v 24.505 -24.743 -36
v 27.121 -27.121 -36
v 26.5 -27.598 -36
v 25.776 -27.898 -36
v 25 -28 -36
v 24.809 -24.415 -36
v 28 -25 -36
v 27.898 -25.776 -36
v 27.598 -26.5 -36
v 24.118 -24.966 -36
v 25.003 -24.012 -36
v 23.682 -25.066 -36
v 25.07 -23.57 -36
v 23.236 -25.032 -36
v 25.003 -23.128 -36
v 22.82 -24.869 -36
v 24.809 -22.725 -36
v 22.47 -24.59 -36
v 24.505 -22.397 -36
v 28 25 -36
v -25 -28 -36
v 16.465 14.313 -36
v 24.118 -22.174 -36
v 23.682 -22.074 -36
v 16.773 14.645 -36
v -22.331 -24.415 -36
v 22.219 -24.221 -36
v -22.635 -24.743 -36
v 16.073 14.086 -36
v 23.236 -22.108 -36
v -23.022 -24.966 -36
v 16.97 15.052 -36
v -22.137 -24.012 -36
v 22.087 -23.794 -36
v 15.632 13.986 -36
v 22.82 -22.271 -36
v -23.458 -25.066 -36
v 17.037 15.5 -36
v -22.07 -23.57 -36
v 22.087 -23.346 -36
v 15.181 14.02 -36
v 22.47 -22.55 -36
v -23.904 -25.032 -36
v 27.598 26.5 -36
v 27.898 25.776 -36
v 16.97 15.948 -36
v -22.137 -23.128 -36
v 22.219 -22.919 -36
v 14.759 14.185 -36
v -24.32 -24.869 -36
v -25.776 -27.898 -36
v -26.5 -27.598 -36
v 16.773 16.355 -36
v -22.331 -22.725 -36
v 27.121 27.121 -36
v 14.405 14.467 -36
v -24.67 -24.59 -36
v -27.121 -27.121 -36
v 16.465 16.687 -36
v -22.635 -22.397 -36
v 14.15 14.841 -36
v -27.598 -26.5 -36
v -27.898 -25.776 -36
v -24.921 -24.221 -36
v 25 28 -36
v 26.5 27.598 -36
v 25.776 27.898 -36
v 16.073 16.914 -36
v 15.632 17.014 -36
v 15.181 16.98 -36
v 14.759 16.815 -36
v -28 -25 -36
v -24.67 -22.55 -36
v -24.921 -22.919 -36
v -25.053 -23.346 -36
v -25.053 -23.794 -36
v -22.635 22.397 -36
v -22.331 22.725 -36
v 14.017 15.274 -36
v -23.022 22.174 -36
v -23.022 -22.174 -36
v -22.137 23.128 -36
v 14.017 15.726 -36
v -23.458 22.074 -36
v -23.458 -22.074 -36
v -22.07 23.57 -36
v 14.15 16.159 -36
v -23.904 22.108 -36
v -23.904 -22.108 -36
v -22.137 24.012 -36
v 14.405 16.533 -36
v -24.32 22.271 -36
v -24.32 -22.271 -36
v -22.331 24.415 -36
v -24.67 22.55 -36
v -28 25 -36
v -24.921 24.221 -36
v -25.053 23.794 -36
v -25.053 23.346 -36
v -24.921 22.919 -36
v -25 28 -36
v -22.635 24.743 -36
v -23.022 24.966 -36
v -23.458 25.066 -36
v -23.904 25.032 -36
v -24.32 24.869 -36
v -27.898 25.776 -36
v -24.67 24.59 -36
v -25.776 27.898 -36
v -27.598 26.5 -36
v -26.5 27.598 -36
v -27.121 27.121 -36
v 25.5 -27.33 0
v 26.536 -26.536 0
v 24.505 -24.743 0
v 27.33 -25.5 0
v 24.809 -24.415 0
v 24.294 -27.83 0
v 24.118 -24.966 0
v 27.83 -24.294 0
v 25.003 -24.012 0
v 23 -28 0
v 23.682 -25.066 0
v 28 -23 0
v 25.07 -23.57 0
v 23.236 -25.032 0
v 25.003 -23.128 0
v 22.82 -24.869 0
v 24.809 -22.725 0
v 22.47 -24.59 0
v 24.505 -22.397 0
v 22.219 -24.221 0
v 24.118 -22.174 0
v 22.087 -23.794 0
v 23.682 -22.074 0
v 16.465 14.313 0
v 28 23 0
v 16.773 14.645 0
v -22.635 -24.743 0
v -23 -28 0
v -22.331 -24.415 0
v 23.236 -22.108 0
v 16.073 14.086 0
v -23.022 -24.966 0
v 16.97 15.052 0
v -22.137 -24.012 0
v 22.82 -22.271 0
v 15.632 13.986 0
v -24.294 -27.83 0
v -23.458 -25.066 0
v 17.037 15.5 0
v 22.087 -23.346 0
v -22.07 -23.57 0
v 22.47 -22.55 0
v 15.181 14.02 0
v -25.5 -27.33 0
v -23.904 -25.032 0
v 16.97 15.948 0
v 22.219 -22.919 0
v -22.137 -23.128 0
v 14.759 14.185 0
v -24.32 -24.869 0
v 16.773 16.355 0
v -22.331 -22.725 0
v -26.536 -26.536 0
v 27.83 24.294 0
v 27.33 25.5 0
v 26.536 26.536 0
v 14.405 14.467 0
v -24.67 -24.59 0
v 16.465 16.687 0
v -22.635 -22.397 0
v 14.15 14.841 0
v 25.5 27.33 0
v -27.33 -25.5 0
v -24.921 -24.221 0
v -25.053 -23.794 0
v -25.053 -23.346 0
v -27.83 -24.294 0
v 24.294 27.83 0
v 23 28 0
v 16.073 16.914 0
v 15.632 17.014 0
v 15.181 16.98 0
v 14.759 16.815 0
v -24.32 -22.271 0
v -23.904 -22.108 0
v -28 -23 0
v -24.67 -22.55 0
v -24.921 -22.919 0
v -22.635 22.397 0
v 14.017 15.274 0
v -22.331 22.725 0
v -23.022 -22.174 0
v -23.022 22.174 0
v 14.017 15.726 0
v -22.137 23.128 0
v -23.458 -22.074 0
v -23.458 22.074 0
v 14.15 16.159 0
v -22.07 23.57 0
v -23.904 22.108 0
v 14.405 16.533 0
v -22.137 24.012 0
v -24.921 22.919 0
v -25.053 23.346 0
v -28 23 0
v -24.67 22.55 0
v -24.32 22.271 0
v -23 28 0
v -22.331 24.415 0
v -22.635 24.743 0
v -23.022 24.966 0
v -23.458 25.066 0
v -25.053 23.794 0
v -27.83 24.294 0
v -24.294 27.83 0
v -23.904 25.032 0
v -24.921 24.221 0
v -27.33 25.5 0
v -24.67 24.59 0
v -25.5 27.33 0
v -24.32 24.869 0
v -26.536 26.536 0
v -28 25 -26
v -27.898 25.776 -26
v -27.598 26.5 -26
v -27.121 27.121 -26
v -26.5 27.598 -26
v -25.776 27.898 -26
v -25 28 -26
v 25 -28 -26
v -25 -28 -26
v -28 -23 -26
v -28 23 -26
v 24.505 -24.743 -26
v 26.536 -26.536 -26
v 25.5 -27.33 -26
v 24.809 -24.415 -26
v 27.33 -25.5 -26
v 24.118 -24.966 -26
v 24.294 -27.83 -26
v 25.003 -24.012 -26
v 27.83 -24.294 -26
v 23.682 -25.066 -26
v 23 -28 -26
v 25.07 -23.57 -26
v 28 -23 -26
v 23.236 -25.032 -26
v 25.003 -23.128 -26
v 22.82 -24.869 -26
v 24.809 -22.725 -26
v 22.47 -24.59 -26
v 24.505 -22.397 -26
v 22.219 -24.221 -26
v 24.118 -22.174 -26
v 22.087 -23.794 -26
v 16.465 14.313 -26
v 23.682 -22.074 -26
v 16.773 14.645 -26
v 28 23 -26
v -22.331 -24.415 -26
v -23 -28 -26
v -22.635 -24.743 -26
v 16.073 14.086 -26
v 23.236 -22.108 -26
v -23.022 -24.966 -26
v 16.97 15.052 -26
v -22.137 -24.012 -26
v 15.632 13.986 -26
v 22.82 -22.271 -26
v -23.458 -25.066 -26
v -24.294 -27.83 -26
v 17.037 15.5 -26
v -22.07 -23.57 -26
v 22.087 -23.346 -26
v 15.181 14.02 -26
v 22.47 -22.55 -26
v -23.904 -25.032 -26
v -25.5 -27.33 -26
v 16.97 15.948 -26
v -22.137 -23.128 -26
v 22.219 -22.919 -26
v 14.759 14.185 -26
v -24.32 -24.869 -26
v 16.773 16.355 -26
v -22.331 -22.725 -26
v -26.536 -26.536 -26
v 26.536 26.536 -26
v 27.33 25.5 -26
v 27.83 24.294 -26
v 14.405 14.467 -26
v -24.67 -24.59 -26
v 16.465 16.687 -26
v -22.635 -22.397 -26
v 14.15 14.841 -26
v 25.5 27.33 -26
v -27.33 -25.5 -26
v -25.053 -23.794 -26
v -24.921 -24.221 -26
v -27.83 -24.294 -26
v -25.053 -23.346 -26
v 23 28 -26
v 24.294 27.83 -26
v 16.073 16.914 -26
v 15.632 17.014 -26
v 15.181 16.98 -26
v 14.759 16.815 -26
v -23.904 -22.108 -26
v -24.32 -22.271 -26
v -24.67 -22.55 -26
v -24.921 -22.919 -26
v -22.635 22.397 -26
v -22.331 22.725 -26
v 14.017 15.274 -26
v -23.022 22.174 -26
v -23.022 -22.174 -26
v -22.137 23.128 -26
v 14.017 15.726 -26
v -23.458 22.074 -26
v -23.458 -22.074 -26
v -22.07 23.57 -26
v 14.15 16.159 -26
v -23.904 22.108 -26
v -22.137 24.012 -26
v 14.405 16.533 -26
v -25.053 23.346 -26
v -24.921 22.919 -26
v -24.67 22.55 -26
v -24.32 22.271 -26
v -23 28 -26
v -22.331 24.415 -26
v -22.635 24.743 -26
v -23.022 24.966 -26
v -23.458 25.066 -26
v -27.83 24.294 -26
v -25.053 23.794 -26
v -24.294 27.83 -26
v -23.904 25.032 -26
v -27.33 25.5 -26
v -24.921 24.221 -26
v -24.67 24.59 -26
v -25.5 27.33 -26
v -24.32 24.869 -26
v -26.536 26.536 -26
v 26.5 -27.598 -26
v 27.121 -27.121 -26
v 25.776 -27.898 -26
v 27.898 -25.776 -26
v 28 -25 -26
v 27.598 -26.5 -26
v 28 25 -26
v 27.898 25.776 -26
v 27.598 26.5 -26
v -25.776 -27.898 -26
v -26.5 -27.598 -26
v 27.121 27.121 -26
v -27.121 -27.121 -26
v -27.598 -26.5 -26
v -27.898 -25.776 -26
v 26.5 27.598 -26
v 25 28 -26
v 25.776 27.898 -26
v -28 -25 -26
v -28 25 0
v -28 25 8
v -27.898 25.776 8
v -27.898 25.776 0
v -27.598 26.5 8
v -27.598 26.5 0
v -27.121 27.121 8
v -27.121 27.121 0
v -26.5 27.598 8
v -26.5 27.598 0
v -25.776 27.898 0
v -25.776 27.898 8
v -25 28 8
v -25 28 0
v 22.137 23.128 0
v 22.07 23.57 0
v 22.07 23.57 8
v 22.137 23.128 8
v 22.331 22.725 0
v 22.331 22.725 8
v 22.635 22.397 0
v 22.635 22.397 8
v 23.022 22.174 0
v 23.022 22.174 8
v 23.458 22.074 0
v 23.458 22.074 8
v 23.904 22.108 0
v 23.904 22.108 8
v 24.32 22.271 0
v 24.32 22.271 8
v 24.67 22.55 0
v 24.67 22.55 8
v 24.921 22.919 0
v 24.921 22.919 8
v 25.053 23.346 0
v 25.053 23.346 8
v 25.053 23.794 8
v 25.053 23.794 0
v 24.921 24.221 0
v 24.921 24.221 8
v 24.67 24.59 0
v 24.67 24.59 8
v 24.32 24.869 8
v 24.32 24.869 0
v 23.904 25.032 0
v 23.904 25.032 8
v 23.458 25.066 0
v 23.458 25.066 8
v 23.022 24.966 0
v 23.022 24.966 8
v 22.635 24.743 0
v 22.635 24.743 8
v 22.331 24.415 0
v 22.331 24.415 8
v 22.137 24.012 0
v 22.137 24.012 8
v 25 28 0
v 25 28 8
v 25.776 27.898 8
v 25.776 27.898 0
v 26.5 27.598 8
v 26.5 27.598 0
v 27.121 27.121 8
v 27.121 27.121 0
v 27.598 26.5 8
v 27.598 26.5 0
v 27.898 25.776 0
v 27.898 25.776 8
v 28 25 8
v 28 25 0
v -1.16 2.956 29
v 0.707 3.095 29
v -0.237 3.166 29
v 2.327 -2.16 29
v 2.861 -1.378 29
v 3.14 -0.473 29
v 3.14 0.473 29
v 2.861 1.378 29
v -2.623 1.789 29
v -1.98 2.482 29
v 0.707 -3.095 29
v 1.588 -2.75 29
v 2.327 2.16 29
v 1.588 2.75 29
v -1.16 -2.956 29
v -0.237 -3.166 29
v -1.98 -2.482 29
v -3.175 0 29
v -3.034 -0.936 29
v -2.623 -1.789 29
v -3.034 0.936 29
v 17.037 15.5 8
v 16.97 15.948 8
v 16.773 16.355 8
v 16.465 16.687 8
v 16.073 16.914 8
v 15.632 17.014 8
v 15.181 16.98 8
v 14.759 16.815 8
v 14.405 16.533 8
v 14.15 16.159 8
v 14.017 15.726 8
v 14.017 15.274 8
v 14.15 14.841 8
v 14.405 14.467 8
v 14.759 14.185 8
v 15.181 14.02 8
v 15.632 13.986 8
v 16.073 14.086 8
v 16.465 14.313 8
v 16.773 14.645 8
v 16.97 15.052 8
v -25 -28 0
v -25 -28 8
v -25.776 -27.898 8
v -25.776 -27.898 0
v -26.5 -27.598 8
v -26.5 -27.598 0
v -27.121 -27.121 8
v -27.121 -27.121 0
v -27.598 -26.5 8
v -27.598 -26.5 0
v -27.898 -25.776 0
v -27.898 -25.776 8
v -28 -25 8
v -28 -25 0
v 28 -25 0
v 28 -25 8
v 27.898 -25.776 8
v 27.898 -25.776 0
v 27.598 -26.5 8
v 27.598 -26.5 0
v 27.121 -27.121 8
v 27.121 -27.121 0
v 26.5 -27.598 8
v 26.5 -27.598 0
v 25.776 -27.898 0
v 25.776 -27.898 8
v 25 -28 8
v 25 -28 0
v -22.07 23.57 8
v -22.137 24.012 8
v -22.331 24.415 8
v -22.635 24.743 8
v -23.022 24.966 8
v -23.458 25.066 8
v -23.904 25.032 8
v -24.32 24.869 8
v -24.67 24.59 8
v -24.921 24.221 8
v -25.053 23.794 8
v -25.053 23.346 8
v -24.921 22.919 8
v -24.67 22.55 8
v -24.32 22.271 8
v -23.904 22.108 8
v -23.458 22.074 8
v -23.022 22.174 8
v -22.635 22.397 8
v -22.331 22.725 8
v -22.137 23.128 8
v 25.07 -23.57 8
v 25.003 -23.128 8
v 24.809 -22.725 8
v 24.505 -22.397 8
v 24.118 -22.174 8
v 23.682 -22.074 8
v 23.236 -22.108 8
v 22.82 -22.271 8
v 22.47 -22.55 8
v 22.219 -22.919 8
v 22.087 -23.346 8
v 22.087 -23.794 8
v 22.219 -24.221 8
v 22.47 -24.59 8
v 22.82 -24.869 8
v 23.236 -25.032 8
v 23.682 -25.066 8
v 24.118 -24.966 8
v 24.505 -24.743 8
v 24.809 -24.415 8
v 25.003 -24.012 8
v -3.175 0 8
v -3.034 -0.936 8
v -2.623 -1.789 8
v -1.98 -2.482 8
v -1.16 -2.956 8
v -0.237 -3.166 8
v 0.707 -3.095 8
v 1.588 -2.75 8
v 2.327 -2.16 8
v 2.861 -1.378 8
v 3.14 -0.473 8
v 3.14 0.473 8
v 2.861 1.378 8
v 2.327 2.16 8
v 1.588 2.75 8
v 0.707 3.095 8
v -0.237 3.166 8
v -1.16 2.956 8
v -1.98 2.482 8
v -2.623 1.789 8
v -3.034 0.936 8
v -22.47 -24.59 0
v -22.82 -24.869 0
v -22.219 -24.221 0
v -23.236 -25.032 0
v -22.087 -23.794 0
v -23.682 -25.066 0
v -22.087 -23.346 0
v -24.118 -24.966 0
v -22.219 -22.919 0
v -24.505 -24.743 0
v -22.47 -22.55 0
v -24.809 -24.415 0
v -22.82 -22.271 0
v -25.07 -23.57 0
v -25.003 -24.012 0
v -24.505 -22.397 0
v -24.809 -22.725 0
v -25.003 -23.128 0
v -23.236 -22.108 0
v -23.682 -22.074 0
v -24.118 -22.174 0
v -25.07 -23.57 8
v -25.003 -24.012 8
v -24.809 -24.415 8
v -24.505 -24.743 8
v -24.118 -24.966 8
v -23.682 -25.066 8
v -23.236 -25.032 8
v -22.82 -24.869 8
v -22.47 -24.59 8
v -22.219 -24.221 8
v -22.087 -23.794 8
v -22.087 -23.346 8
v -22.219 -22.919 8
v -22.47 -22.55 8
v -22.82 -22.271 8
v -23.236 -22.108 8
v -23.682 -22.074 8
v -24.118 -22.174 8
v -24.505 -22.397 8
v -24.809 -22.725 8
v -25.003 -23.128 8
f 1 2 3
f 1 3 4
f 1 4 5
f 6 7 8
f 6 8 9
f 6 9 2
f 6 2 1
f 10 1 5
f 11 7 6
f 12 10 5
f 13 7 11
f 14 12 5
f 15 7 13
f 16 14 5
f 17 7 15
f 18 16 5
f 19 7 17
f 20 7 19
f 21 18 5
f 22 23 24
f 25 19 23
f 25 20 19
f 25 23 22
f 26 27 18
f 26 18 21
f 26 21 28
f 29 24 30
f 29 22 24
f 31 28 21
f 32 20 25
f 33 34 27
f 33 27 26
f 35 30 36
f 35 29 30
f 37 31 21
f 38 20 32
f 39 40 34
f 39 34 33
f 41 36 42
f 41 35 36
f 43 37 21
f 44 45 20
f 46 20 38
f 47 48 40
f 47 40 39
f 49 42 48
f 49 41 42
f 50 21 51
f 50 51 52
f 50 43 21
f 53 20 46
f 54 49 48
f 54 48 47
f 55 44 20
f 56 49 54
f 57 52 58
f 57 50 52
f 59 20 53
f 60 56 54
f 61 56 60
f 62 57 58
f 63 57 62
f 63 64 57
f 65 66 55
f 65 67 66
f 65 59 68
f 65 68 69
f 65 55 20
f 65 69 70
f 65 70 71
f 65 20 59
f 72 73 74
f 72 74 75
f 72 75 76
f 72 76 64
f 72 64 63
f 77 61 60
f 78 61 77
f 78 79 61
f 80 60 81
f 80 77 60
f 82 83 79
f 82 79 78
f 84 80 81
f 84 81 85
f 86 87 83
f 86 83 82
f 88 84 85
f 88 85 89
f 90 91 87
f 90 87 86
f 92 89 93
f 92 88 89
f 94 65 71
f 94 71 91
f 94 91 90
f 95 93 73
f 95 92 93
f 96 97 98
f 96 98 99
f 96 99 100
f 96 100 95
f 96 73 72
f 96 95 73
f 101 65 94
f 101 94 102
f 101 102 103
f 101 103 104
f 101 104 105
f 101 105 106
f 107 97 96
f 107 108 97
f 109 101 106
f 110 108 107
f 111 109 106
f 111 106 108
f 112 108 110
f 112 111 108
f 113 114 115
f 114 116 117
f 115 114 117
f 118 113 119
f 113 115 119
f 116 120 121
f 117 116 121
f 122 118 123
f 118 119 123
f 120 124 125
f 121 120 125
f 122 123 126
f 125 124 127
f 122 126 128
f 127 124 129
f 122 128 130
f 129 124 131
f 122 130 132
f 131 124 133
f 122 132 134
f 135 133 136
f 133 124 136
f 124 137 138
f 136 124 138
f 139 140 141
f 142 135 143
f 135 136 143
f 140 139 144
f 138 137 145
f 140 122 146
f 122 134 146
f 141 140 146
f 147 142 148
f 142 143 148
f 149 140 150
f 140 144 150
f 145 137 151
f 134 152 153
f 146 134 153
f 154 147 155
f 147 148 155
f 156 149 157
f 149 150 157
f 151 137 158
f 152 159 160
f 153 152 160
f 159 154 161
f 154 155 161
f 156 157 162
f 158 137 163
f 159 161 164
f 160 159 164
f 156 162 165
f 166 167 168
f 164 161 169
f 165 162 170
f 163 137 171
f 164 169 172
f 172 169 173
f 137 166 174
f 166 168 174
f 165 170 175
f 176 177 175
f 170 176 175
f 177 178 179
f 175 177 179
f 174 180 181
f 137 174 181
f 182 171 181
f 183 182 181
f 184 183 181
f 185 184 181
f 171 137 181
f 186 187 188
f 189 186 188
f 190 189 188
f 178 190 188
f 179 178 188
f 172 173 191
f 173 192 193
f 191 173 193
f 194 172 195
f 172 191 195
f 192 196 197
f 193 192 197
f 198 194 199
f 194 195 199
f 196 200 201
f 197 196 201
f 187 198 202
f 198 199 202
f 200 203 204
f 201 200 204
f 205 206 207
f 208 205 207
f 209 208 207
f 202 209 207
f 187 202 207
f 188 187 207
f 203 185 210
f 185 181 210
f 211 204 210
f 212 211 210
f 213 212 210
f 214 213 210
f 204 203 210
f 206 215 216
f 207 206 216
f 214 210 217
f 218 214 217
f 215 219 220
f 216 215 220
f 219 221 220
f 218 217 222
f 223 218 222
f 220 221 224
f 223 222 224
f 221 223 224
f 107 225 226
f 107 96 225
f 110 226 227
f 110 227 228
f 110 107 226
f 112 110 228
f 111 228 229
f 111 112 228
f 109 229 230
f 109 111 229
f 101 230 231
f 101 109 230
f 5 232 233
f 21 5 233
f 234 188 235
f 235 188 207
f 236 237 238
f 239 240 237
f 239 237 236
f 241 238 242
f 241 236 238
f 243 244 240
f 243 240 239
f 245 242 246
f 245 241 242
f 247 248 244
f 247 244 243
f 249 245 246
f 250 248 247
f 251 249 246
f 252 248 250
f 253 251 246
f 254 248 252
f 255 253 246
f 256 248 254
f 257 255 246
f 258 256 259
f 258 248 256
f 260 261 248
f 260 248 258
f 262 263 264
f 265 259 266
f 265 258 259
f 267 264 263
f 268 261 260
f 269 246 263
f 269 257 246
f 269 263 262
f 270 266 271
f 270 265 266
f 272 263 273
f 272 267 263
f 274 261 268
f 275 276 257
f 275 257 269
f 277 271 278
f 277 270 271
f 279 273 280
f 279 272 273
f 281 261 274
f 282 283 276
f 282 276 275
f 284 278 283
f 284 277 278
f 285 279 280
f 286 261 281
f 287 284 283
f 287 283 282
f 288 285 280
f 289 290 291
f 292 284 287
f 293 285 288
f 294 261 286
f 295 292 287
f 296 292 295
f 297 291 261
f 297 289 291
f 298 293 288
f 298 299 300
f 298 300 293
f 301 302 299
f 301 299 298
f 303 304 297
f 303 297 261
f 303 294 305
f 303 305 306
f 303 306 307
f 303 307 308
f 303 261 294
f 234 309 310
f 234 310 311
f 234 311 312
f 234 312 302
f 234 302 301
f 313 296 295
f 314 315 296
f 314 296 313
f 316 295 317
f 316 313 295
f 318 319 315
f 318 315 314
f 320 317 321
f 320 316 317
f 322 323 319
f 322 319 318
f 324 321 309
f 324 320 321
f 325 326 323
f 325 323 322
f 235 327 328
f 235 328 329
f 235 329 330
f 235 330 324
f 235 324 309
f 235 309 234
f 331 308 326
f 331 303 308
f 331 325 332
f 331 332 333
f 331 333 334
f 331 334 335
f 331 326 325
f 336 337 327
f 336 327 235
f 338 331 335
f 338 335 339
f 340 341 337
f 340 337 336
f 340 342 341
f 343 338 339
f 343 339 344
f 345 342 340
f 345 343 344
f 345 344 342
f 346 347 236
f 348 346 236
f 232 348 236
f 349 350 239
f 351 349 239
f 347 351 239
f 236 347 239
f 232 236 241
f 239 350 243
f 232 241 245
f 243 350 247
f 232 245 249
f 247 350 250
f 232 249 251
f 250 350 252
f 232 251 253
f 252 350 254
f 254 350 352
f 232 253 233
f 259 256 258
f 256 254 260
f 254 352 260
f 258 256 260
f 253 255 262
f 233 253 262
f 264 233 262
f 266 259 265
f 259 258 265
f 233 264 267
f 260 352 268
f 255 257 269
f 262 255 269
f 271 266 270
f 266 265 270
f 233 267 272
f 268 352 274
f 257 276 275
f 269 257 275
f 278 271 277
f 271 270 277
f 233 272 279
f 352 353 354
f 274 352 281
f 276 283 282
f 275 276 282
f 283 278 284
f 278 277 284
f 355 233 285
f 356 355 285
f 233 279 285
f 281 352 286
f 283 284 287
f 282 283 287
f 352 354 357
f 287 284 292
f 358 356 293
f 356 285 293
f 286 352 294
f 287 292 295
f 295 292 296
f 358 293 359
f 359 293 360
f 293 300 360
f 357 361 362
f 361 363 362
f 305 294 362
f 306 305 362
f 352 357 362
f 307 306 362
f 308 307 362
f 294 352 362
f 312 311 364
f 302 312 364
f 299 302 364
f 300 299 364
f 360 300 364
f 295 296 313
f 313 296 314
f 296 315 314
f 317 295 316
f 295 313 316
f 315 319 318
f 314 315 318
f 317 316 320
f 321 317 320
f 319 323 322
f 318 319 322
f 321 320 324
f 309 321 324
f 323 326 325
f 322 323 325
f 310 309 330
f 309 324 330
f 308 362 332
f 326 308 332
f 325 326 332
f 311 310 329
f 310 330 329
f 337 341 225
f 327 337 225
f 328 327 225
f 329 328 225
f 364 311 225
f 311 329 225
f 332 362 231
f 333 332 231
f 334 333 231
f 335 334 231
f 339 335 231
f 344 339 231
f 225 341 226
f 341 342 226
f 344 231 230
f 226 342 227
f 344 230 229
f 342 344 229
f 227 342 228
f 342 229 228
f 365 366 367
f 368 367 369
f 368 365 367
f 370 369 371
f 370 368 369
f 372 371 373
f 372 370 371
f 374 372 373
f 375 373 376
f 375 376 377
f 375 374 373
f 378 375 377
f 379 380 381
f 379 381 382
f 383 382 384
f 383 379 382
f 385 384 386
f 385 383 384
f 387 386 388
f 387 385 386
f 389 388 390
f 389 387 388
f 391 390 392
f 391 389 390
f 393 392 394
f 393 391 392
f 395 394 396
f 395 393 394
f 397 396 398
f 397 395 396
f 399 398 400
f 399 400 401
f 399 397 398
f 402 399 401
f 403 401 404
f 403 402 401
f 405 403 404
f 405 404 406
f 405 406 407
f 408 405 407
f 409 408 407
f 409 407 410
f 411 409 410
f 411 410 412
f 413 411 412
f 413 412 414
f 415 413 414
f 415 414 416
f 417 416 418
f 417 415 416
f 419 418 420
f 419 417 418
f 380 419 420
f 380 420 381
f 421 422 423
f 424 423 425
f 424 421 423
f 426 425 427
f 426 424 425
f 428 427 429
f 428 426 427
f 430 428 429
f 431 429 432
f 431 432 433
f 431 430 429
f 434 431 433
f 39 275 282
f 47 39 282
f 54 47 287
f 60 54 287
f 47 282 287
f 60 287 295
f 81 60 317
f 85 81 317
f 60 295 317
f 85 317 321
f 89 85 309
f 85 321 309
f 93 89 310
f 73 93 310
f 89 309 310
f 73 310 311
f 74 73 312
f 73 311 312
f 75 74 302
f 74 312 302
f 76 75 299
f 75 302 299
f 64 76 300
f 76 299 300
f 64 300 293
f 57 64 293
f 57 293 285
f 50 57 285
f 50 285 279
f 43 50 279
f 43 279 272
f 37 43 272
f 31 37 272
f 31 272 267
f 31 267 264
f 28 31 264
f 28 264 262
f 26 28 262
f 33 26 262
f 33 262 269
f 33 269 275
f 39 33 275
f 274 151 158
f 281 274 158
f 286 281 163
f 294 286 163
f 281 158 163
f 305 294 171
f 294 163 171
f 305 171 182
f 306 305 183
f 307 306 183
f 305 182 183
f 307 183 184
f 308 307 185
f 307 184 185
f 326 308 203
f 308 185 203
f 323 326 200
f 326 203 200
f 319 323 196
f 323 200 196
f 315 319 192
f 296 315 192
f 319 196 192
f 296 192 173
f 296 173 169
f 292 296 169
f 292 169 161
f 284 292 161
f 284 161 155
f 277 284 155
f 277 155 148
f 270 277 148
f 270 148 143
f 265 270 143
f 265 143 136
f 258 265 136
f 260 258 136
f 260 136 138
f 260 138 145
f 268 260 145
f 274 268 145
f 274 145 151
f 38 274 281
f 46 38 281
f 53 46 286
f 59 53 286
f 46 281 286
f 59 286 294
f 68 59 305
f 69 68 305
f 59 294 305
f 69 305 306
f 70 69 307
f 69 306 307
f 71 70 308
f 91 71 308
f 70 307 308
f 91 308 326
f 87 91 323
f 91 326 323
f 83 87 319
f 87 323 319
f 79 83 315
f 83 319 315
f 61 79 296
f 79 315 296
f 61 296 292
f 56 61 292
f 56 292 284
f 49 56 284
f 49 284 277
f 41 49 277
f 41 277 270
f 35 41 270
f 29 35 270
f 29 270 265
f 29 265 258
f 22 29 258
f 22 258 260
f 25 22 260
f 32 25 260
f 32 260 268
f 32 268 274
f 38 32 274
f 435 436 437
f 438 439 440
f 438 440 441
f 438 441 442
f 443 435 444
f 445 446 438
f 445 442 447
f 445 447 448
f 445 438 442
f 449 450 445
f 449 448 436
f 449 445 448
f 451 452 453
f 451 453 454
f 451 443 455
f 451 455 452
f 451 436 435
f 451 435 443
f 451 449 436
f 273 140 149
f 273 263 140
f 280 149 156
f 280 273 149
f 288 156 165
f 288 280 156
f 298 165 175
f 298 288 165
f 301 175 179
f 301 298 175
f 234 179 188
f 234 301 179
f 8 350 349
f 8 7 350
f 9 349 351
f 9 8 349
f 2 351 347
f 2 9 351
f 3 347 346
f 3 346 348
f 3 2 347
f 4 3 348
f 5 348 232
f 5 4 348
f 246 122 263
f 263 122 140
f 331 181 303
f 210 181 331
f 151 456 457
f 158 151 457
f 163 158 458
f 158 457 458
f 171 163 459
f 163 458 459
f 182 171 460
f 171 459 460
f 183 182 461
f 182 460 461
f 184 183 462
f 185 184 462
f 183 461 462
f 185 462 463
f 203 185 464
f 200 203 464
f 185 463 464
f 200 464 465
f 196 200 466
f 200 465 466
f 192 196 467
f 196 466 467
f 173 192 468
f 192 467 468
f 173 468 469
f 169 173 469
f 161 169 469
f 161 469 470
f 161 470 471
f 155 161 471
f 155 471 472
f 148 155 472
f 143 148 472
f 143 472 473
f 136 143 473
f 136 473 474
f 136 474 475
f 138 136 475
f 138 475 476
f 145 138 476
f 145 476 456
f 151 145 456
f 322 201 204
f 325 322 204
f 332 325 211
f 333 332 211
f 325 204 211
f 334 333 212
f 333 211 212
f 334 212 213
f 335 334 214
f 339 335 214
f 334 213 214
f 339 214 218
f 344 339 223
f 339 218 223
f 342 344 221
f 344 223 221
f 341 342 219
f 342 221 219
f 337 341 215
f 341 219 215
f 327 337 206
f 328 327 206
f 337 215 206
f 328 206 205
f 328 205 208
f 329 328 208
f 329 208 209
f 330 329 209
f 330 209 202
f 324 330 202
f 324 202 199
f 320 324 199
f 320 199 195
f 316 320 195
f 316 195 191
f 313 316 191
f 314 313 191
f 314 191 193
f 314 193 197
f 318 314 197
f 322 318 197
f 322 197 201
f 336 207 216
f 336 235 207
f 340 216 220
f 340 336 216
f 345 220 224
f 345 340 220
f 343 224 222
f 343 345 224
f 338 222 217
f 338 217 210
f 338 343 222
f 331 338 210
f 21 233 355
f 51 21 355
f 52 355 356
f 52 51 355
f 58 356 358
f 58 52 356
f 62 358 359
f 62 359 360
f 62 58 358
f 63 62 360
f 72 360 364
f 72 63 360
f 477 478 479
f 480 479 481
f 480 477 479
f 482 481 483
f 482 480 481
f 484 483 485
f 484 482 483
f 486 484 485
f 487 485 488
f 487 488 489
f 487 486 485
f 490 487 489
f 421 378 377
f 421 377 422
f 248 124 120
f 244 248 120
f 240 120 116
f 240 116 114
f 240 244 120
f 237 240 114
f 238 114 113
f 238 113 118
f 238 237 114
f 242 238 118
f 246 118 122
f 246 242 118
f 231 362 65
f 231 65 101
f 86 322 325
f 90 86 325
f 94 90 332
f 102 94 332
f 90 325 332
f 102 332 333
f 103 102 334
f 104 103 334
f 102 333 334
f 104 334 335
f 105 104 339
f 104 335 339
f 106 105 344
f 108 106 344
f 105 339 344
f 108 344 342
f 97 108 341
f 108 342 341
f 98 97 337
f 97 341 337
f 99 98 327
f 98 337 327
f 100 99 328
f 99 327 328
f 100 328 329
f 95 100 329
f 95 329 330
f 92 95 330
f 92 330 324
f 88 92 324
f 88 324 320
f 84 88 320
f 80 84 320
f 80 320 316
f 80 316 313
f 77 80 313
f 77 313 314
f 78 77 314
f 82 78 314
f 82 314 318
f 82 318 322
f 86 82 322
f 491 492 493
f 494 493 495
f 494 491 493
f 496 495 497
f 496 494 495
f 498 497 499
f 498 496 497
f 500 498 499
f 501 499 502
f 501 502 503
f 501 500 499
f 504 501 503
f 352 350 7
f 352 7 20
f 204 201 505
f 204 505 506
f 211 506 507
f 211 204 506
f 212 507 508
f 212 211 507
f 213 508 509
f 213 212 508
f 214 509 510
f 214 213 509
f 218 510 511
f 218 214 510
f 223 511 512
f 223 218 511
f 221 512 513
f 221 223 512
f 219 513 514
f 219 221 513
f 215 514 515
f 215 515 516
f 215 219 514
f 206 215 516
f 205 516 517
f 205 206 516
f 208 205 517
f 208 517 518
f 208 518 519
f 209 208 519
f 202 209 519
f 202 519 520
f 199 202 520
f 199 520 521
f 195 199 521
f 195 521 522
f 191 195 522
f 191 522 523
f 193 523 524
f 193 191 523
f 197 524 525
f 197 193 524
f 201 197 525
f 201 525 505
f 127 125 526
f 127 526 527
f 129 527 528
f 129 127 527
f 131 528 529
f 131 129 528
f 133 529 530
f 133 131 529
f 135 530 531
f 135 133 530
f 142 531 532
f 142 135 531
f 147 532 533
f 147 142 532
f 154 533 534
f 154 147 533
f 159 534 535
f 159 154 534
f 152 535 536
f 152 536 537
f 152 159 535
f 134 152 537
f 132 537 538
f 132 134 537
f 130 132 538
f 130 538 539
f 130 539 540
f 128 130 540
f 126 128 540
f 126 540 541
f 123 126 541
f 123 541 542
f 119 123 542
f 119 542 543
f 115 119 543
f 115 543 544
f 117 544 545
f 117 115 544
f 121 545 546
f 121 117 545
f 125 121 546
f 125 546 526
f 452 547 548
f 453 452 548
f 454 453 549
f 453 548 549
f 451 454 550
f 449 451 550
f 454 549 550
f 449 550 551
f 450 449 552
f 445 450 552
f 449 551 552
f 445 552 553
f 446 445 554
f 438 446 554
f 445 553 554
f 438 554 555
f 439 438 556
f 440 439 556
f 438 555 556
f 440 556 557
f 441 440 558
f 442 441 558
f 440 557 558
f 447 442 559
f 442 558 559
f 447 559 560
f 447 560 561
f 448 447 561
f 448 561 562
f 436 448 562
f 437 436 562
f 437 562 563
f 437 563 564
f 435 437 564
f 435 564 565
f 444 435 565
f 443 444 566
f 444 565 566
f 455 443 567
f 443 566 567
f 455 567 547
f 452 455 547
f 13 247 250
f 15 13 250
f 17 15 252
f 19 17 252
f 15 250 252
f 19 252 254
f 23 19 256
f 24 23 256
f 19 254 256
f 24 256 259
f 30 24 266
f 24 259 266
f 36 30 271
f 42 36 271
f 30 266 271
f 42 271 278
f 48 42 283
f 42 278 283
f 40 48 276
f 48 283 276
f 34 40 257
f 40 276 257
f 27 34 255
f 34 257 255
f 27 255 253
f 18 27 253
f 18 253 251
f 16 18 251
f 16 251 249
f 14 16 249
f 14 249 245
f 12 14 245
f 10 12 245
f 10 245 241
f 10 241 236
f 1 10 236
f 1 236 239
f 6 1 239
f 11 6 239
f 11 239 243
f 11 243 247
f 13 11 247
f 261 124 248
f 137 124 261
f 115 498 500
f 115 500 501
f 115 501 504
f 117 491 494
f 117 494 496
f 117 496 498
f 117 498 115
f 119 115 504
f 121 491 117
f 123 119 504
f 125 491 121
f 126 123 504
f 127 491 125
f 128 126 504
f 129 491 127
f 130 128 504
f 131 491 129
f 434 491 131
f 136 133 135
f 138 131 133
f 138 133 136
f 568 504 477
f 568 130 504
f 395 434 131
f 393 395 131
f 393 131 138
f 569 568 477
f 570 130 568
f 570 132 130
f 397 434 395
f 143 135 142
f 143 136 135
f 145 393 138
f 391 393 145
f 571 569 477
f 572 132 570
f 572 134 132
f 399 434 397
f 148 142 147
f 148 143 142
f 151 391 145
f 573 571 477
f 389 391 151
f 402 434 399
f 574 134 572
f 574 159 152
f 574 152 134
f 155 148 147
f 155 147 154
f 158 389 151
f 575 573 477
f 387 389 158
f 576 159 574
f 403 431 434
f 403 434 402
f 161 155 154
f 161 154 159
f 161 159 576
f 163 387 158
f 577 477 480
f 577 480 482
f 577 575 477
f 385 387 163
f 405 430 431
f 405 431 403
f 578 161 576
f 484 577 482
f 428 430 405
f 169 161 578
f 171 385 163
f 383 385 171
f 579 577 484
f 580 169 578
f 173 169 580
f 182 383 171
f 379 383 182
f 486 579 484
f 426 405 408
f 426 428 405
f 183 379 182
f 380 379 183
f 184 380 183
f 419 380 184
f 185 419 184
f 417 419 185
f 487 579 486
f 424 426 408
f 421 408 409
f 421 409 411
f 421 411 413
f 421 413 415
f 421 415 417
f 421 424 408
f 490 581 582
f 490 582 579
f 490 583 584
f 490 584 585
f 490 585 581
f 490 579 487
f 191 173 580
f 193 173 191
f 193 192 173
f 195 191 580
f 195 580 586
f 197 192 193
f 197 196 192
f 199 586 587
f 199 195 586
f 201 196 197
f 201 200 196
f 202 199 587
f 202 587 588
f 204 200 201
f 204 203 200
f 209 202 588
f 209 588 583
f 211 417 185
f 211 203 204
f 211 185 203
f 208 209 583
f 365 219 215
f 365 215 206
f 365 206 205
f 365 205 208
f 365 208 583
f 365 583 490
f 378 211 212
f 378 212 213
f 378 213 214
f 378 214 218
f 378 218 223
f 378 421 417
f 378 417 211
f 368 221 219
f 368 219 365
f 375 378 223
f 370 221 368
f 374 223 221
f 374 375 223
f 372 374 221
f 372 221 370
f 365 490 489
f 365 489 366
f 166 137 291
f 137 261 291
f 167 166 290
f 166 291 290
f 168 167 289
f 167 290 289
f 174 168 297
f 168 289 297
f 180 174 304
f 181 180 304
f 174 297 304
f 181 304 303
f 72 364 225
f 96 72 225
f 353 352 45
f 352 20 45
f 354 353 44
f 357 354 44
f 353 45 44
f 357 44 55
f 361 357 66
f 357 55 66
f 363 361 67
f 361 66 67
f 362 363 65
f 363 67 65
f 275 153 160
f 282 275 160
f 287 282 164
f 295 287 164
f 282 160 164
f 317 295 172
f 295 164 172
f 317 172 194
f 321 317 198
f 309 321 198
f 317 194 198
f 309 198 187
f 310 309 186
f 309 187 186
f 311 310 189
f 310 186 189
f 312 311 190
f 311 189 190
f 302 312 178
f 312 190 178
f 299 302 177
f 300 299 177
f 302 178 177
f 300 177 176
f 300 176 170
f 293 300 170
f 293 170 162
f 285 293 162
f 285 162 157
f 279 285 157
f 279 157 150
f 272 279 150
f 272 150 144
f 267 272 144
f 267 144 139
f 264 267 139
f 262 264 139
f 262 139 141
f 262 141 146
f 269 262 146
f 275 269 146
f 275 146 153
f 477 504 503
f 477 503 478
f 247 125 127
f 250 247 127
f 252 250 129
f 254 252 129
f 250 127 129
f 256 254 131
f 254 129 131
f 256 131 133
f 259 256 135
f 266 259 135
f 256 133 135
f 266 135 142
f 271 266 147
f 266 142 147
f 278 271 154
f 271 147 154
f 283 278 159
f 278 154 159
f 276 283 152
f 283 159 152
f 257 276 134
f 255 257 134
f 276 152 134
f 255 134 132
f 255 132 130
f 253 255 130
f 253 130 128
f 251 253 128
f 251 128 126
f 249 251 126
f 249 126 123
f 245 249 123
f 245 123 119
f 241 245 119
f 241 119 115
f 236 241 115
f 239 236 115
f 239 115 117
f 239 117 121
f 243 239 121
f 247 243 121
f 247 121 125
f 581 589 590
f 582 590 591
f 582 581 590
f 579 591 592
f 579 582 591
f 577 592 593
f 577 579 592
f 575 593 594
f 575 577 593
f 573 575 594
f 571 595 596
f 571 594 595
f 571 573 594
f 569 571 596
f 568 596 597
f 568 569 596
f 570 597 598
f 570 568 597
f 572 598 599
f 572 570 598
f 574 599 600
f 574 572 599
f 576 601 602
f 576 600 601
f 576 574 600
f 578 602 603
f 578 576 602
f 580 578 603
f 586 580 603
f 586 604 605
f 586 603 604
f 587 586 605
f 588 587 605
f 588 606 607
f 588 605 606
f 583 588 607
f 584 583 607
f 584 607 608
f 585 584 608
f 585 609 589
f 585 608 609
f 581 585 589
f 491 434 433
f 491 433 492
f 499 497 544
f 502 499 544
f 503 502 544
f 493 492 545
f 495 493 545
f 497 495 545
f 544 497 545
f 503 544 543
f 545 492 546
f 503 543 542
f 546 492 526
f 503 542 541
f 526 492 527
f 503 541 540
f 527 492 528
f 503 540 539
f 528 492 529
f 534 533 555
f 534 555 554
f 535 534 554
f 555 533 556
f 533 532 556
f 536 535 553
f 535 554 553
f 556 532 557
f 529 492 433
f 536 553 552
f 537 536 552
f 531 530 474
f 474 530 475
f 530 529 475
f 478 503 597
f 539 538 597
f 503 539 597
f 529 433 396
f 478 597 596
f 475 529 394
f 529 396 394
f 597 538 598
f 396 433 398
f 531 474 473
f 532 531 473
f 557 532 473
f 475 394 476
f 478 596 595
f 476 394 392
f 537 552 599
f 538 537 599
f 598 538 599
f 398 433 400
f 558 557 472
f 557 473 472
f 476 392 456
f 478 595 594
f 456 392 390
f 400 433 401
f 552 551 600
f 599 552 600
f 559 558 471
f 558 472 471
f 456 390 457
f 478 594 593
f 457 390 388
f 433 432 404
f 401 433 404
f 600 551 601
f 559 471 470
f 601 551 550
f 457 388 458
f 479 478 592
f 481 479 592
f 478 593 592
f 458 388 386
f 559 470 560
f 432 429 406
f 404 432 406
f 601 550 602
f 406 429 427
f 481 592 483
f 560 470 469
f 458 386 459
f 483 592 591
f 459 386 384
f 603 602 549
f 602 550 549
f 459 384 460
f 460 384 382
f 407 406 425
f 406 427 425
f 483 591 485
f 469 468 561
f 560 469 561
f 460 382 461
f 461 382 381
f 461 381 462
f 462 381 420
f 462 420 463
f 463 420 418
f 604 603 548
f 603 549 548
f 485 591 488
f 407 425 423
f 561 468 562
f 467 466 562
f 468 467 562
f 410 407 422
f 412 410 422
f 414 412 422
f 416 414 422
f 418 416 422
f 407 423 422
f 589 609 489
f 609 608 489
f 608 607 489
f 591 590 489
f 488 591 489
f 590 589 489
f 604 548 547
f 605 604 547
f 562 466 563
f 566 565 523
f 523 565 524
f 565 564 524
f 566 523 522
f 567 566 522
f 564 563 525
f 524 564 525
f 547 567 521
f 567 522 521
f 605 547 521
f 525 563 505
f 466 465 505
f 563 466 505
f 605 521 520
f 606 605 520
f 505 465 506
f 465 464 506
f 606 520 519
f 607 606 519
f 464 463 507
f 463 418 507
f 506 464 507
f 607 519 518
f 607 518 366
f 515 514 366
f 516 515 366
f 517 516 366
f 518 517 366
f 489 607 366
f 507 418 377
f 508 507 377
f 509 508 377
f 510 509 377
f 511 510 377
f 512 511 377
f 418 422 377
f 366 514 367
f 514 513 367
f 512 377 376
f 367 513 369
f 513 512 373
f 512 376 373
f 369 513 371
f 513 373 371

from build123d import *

# Parameters (mm, degrees)
SKETCH_1_R          = 1.5
EXTRUDE_1_DEPTH     = 8
SKETCH_4_R          = 3.175
EXTRUDE_2_DEPTH     = 21
SKETCH_9_W          = 56
SKETCH_9_H          = 56
EXTRUDE_7_DEPTH     = 26
SKETCH_10_W         = 56
SKETCH_10_H         = 56
EXTRUDE_8_DEPTH     = 10
FILLET_1_R          = 3
FILLET_2_R          = 5
SKETCH_12_R         = 1.5
SKETCH_12_R_2       = 1.518540069
CUT_EXTRUDE_1_DEPTH = 60.194594348


with BuildPart() as part:
    # 草图1 → 凸台-拉伸1 (new body)
    with BuildSketch(Plane.XY):
        with BuildLine():
            Line((-25, 28), (25, 28))
            ThreePointArc((25, 28), (27.121320344, 27.121320344), (28, 25))
            Line((28, 25), (28, -25))
            ThreePointArc((28, -25), (27.121320344, -27.121320344), (25, -28))
            Line((25, -28), (-25, -28))
            ThreePointArc((-25, -28), (-27.121320344, -27.121320344), (-28, -25))
            Line((-28, -25), (-28, 25))
            ThreePointArc((-28, 25), (-27.121320344, 27.121320344), (-25, 28))
        make_face()
        with Locations((-23.57, 23.57)):
            Circle(SKETCH_1_R, mode=Mode.SUBTRACT)
        with Locations(Location((23.57, 23.57, 0), (0, 0, 180))):
            Circle(SKETCH_1_R, mode=Mode.SUBTRACT)
        with Locations((23.57, -23.57)):
            Circle(SKETCH_1_R, mode=Mode.SUBTRACT)
        with Locations(Location((-23.57, -23.57, 0), (0, 0, 180))):
            Circle(SKETCH_1_R, mode=Mode.SUBTRACT)
    extrude(amount=EXTRUDE_1_DEPTH)

    # 草图4 → 凸台-拉伸2 (add)
    with BuildSketch(Plane.XY.offset(8)):
        with Locations(Location((0, 0, 0), (0, 0, 180))):
            Circle(SKETCH_4_R)
    extrude(amount=EXTRUDE_2_DEPTH)


with BuildPart() as body_2:
    # 草图9 → 凸台-拉伸7 (new body)
    with BuildSketch(Plane(origin=(0, 0, 0), x_dir=(-1, 0, 0), z_dir=(0, 0, -1))):
        Rectangle(SKETCH_9_W, SKETCH_9_H)
    extrude(amount=EXTRUDE_7_DEPTH)

    # 圆角2
    fillet_2_edges = [body_2.edges().sort_by_distance(p)[0] for p in [
        (-28, -28, -13),
        (28, -28, -13),
        (28, 28, -13),
        (-28, 28, -13),
    ]]
    fillet(fillet_2_edges, radius=FILLET_2_R)


with BuildPart() as body_3:
    # 草图10 → 凸台-拉伸8 (new body)
    with BuildSketch(Plane(origin=(0, 0, -26), x_dir=(-1, 0, 0), z_dir=(0, 0, -1))):
        Rectangle(SKETCH_10_W, SKETCH_10_H)
    extrude(amount=EXTRUDE_8_DEPTH)

    # 圆角1
    fillet_1_edges = [body_3.edges().sort_by_distance(p)[0] for p in [
        (28, 28, -31),
        (-28, 28, -31),
        (-28, -28, -31),
        (28, -28, -31),
    ]]
    fillet(fillet_1_edges, radius=FILLET_1_R)


with BuildPart() as cut_extrude_1_tool:
    # 草图12 → 切除-拉伸1 (new, through all)
    with BuildSketch(Plane.XY.offset(8)):
        with Locations((-23.57, 23.57)):
            Circle(SKETCH_12_R)
        with Locations((15.518540069, 15.5)):
            Circle(SKETCH_12_R_2)
        with Locations((-23.57, -23.57)):
            Circle(SKETCH_12_R)
        with Locations((23.57, -23.57)):
            Circle(SKETCH_12_R)
    extrude(amount=-CUT_EXTRUDE_1_DEPTH)


with BuildPart() as part_1:
    add(part.part)

    # 切除-拉伸1: cut by cut_extrude_1_tool
    add(cut_extrude_1_tool.part, mode=Mode.SUBTRACT)


with BuildPart() as body_2_1:
    add(body_2.part)

    # 切除-拉伸1: cut by cut_extrude_1_tool
    add(cut_extrude_1_tool.part, mode=Mode.SUBTRACT)


with BuildPart() as body_3_1:
    add(body_3.part)

    # 切除-拉伸1: cut by cut_extrude_1_tool
    add(cut_extrude_1_tool.part, mode=Mode.SUBTRACT)


solid = Compound([part_1.part, body_2_1.part, body_3_1.part])
